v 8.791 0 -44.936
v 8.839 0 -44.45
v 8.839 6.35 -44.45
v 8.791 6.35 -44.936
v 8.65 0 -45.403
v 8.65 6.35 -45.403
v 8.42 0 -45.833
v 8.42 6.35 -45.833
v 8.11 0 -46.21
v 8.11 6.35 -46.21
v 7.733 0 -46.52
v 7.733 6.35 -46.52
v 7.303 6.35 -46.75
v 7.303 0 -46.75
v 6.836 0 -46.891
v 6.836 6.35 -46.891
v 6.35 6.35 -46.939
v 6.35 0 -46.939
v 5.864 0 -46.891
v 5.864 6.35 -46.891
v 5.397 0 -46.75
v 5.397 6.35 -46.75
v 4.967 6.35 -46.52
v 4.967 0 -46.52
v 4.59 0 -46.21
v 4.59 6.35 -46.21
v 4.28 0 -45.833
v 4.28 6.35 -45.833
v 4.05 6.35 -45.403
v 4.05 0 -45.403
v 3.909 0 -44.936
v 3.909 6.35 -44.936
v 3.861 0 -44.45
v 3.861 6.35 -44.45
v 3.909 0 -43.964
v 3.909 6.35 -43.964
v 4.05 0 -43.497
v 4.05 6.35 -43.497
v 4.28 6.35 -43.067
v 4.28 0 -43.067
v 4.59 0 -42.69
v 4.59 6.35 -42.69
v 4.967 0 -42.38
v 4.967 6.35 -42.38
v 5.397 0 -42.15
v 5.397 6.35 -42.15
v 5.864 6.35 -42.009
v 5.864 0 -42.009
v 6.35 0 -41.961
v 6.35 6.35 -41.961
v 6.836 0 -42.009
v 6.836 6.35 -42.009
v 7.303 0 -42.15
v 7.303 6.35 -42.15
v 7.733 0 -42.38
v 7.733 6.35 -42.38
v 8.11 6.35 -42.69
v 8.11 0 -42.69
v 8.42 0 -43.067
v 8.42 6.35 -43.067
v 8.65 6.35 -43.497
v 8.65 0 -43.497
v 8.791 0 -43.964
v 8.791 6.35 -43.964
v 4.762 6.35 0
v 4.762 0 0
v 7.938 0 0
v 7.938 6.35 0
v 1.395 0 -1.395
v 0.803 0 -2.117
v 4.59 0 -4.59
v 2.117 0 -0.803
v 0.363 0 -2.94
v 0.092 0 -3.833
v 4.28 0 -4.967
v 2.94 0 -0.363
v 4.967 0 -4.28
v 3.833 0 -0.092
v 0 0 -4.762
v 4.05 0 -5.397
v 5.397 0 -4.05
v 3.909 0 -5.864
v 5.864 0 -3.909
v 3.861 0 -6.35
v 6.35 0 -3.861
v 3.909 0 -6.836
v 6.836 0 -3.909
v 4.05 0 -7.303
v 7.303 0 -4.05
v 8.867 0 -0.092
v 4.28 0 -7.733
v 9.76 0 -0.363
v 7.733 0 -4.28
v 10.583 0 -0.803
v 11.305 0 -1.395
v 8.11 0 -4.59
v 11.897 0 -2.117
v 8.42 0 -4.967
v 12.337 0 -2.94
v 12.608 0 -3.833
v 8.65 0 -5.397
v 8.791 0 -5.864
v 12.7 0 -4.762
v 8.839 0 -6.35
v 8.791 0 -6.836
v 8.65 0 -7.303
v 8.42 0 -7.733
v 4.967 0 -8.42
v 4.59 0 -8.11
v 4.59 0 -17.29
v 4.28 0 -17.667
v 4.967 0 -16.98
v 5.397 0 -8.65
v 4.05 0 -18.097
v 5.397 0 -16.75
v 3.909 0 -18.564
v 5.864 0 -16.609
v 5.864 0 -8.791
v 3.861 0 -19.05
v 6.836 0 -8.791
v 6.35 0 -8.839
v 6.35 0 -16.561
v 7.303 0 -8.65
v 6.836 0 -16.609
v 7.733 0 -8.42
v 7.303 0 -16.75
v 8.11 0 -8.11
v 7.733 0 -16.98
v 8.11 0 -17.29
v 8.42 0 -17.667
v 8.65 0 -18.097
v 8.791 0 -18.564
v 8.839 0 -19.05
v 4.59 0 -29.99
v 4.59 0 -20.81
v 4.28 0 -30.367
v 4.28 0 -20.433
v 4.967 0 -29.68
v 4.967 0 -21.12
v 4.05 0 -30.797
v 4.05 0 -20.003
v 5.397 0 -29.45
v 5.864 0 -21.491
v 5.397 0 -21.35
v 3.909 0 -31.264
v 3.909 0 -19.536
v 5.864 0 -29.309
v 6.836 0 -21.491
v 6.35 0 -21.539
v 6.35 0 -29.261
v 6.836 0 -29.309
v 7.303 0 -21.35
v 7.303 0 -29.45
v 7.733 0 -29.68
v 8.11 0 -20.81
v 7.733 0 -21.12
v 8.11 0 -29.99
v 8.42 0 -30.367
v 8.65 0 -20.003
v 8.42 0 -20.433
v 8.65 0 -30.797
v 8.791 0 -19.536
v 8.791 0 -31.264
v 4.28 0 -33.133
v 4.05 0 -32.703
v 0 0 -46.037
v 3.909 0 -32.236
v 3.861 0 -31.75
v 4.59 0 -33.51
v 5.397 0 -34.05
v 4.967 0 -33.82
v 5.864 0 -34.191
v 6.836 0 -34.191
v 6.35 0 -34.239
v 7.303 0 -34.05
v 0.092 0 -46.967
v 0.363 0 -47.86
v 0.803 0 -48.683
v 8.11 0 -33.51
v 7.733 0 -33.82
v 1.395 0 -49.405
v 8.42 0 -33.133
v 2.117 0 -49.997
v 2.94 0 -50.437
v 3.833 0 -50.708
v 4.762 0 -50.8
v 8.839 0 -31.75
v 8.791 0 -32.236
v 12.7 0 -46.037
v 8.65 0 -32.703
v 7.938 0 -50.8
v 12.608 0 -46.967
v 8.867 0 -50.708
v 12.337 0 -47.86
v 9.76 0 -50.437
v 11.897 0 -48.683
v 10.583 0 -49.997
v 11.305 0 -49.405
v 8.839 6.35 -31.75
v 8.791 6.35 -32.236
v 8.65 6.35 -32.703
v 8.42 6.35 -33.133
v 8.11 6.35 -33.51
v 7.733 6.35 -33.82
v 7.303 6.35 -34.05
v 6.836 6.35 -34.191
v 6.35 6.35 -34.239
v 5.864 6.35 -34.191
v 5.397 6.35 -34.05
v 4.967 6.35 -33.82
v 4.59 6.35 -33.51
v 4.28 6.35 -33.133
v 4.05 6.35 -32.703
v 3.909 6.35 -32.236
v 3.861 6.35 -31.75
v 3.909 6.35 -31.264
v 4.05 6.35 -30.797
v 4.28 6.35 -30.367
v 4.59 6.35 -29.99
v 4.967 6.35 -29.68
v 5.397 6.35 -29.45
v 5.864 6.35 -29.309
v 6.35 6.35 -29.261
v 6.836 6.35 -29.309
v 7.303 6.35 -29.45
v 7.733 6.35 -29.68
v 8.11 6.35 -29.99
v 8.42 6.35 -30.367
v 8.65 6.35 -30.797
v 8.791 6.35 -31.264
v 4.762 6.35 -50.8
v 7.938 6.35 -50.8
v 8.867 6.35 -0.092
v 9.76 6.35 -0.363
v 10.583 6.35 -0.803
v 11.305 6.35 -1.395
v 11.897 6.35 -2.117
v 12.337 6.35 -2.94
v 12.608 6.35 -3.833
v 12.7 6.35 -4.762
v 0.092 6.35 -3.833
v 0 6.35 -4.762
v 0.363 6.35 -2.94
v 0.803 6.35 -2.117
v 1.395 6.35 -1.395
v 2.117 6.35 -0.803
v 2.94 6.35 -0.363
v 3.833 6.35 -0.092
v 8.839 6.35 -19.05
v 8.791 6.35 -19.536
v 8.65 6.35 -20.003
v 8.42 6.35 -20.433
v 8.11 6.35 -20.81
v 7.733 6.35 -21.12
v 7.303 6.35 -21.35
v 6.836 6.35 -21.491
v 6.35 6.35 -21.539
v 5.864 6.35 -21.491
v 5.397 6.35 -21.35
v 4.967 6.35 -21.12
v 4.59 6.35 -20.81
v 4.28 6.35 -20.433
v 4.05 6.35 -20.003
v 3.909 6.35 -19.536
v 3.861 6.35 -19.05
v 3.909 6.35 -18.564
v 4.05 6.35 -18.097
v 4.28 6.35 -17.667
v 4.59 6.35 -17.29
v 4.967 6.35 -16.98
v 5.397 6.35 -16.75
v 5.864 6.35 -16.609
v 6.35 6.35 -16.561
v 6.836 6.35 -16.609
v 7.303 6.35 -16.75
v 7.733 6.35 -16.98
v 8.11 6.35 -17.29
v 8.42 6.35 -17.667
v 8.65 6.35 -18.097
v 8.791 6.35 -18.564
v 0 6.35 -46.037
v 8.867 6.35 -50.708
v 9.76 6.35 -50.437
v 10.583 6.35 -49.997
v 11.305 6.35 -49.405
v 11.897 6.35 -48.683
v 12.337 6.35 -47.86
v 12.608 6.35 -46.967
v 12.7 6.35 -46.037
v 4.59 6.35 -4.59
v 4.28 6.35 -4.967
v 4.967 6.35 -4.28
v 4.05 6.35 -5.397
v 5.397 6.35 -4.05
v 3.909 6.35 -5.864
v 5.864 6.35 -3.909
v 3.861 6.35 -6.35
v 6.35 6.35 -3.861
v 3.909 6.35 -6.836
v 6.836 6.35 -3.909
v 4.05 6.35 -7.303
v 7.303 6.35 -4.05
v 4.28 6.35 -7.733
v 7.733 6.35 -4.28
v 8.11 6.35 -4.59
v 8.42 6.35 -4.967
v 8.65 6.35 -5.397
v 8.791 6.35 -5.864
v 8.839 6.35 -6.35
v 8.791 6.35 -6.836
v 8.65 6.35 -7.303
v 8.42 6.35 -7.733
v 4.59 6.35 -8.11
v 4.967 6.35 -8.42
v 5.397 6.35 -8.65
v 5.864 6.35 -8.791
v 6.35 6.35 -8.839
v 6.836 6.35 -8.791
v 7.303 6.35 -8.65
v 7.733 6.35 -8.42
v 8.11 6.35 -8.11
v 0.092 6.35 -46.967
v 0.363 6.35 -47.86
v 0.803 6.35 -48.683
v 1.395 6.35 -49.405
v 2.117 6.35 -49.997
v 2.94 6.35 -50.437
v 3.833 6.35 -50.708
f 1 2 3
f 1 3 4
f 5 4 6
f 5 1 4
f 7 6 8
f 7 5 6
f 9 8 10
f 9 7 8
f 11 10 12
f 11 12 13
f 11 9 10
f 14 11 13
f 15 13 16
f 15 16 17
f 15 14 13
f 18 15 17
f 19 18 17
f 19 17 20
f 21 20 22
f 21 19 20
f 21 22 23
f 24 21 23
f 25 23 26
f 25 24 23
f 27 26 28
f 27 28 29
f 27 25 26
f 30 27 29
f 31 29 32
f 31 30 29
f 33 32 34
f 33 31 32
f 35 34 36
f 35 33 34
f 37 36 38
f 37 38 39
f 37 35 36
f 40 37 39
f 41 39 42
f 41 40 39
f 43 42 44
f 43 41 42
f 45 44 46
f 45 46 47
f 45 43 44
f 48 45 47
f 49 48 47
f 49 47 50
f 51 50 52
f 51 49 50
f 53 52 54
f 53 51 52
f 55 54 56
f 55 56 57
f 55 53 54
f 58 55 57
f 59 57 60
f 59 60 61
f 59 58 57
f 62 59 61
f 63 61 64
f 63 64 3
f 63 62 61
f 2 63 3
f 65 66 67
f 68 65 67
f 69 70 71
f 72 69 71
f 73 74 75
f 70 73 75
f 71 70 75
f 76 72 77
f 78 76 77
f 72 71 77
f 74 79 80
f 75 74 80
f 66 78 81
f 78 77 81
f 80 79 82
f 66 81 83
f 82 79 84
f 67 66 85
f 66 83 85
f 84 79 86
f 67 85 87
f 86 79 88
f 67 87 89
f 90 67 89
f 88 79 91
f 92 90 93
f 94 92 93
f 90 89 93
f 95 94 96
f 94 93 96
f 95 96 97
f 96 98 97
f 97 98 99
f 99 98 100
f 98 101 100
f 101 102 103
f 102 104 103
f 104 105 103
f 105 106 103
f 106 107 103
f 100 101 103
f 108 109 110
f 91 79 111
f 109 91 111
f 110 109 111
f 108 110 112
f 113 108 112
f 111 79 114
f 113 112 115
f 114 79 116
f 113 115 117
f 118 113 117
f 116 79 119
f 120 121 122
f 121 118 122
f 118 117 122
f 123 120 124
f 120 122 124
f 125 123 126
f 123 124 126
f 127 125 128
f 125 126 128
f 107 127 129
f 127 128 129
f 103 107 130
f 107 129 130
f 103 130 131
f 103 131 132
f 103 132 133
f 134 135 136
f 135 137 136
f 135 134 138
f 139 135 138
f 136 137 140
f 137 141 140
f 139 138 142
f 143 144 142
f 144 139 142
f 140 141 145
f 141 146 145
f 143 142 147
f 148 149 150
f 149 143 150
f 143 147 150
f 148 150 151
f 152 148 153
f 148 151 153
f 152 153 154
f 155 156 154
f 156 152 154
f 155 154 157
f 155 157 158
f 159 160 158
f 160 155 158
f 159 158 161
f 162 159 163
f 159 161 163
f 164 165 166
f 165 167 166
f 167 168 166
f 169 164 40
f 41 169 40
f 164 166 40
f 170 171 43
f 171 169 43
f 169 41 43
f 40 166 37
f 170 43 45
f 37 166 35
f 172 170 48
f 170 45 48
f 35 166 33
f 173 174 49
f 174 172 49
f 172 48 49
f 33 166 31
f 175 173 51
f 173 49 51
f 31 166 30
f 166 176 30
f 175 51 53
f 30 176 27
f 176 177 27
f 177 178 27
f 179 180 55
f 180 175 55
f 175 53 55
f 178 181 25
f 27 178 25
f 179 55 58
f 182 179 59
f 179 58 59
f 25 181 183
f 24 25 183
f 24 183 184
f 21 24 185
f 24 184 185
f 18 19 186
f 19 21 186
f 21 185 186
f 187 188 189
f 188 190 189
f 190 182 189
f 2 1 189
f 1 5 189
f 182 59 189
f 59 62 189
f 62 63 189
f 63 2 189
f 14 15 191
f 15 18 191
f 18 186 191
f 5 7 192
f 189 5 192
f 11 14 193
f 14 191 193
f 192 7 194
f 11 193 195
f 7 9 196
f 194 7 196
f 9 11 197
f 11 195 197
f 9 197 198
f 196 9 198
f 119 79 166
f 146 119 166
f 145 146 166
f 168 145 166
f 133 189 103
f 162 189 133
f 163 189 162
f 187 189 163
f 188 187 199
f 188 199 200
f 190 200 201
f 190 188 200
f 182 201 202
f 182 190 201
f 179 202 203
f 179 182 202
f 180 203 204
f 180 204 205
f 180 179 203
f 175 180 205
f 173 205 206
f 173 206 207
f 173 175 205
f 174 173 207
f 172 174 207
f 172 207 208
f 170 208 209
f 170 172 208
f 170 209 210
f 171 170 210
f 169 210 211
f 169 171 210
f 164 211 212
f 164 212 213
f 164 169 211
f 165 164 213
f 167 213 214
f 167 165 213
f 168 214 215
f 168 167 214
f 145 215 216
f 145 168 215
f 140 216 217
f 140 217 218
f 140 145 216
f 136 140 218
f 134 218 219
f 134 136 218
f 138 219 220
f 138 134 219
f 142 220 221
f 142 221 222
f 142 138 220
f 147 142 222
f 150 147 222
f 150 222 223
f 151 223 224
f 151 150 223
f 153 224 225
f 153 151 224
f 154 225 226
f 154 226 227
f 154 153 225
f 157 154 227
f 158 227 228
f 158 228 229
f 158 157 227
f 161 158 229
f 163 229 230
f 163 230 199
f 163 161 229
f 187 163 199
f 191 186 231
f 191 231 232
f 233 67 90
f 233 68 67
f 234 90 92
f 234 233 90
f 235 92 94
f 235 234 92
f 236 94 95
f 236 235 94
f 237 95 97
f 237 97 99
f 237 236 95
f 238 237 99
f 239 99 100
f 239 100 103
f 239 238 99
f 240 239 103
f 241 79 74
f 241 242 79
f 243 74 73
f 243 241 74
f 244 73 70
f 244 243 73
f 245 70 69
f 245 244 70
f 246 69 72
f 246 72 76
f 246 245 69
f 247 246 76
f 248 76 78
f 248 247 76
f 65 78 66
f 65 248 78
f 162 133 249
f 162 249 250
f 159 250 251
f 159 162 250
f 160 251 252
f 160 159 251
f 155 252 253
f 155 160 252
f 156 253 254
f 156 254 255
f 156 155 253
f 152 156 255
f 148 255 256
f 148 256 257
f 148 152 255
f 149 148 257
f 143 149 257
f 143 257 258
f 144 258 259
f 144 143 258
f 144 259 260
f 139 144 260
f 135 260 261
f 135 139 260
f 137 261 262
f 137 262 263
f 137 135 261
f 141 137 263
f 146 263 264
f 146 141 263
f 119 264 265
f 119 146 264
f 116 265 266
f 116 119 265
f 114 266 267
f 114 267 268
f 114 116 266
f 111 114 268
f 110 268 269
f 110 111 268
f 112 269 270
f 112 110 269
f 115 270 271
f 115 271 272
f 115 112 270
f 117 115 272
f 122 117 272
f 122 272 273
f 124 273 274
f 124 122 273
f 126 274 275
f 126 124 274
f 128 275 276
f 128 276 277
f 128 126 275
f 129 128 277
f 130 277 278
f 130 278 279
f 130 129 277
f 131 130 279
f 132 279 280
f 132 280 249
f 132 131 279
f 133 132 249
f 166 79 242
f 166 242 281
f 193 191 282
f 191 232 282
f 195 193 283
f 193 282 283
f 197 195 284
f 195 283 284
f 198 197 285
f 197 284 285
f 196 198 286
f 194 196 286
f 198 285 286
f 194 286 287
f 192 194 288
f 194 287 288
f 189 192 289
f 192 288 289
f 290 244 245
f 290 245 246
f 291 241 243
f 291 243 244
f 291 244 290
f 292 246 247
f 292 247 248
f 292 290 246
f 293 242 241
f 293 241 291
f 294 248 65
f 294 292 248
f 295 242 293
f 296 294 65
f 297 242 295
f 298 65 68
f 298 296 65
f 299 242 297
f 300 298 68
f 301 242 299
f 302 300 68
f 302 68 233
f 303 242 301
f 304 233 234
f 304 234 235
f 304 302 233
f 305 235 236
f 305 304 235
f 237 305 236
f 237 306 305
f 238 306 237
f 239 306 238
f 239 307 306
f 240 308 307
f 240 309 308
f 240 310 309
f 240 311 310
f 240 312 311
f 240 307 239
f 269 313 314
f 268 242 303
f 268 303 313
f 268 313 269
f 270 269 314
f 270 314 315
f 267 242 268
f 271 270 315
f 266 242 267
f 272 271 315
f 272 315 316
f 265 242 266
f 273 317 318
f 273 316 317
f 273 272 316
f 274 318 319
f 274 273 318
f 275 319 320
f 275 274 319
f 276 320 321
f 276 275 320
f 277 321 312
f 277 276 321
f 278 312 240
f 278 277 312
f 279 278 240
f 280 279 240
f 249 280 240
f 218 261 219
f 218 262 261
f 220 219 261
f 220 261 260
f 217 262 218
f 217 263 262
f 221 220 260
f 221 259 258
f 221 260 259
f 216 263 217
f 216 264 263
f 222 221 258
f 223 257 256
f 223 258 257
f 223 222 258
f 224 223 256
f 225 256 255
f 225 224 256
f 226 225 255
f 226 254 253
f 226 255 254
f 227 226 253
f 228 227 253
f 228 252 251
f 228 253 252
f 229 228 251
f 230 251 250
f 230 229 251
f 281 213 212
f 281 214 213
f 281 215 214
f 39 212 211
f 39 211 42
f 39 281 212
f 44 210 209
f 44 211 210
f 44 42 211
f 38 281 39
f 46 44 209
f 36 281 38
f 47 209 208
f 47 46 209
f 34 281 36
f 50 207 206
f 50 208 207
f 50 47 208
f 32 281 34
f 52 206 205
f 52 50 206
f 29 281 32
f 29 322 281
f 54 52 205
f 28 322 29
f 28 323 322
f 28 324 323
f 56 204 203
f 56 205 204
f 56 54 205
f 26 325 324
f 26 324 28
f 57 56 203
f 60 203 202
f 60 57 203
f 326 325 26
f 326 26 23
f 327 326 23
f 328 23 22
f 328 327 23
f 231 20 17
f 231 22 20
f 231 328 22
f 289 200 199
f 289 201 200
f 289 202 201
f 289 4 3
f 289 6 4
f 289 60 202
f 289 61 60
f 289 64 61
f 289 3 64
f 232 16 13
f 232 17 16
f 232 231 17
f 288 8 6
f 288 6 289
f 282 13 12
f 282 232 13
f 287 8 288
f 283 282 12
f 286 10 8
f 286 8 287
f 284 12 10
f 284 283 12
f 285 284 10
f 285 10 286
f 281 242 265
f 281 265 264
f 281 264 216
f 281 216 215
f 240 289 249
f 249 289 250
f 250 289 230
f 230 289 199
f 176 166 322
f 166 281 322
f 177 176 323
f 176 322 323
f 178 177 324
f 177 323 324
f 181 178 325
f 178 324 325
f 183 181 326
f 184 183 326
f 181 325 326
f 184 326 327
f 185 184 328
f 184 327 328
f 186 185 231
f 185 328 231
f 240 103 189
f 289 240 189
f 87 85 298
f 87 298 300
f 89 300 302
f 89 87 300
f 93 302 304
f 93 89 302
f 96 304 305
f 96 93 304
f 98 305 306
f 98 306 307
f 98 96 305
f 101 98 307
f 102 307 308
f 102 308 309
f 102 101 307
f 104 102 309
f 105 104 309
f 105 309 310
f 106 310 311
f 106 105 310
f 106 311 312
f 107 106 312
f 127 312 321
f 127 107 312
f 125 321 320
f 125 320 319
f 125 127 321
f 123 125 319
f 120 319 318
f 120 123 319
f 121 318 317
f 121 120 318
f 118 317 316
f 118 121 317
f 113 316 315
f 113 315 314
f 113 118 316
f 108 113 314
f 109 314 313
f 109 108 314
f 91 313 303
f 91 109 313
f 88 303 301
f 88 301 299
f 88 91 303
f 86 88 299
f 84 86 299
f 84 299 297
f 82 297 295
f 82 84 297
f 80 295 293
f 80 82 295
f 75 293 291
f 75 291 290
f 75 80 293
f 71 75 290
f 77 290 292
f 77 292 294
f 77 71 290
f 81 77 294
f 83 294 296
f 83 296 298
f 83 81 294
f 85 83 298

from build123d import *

# Parameters (mm, degrees)
SKETCH1_W           = 12.7
SKETCH1_H           = 50.8
SKETCH1_R           = 2.4892
BOSS_EXTRUDE1_DEPTH = 6.35
LPATTERN1_OUTLINE_R = 2.4892
LPATTERN1_DEPTH     = 6.35
FILLET1_R           = 4.7625


# Read off the part's stored shape, not the designer's step: LPattern1
with BuildPart() as part:
    # Sketch1 → Boss-Extrude1 (new body)
    with BuildSketch(Plane(origin=(0, 0, 0), x_dir=(1, 0, 0), z_dir=(0, 1, 0))):
        with Locations((6.35, 25.4)):
            Rectangle(SKETCH1_W, SKETCH1_H)
        with Locations(Location((6.35, 6.35, 0), (0, 0, 270))):
            Circle(SKETCH1_R, mode=Mode.SUBTRACT)
    extrude(amount=BOSS_EXTRUDE1_DEPTH)

    # LPattern1 outline → LPattern1 (cut)
    with BuildSketch(Plane(origin=(0, 0, 0), x_dir=(1, 0, 0), z_dir=(0, 1, 0))):
        with Locations((6.35, 44.45)):
            Circle(LPATTERN1_OUTLINE_R)
        with Locations((6.35, 31.75)):
            Circle(LPATTERN1_OUTLINE_R)
        with Locations((6.35, 19.05)):
            Circle(LPATTERN1_OUTLINE_R)
    extrude(amount=LPATTERN1_DEPTH, mode=Mode.SUBTRACT)

    # Fillet1
    fillet1_edges = [part.edges().sort_by_distance(p)[0] for p in [
        (0, 3.175, -50.8),
        (12.7, 3.175, -50.8),
        (12.7, 3.175, 0),
        (0, 3.175, 0),
    ]]
    fillet(fillet1_edges, radius=FILLET1_R)


solid = part.part
